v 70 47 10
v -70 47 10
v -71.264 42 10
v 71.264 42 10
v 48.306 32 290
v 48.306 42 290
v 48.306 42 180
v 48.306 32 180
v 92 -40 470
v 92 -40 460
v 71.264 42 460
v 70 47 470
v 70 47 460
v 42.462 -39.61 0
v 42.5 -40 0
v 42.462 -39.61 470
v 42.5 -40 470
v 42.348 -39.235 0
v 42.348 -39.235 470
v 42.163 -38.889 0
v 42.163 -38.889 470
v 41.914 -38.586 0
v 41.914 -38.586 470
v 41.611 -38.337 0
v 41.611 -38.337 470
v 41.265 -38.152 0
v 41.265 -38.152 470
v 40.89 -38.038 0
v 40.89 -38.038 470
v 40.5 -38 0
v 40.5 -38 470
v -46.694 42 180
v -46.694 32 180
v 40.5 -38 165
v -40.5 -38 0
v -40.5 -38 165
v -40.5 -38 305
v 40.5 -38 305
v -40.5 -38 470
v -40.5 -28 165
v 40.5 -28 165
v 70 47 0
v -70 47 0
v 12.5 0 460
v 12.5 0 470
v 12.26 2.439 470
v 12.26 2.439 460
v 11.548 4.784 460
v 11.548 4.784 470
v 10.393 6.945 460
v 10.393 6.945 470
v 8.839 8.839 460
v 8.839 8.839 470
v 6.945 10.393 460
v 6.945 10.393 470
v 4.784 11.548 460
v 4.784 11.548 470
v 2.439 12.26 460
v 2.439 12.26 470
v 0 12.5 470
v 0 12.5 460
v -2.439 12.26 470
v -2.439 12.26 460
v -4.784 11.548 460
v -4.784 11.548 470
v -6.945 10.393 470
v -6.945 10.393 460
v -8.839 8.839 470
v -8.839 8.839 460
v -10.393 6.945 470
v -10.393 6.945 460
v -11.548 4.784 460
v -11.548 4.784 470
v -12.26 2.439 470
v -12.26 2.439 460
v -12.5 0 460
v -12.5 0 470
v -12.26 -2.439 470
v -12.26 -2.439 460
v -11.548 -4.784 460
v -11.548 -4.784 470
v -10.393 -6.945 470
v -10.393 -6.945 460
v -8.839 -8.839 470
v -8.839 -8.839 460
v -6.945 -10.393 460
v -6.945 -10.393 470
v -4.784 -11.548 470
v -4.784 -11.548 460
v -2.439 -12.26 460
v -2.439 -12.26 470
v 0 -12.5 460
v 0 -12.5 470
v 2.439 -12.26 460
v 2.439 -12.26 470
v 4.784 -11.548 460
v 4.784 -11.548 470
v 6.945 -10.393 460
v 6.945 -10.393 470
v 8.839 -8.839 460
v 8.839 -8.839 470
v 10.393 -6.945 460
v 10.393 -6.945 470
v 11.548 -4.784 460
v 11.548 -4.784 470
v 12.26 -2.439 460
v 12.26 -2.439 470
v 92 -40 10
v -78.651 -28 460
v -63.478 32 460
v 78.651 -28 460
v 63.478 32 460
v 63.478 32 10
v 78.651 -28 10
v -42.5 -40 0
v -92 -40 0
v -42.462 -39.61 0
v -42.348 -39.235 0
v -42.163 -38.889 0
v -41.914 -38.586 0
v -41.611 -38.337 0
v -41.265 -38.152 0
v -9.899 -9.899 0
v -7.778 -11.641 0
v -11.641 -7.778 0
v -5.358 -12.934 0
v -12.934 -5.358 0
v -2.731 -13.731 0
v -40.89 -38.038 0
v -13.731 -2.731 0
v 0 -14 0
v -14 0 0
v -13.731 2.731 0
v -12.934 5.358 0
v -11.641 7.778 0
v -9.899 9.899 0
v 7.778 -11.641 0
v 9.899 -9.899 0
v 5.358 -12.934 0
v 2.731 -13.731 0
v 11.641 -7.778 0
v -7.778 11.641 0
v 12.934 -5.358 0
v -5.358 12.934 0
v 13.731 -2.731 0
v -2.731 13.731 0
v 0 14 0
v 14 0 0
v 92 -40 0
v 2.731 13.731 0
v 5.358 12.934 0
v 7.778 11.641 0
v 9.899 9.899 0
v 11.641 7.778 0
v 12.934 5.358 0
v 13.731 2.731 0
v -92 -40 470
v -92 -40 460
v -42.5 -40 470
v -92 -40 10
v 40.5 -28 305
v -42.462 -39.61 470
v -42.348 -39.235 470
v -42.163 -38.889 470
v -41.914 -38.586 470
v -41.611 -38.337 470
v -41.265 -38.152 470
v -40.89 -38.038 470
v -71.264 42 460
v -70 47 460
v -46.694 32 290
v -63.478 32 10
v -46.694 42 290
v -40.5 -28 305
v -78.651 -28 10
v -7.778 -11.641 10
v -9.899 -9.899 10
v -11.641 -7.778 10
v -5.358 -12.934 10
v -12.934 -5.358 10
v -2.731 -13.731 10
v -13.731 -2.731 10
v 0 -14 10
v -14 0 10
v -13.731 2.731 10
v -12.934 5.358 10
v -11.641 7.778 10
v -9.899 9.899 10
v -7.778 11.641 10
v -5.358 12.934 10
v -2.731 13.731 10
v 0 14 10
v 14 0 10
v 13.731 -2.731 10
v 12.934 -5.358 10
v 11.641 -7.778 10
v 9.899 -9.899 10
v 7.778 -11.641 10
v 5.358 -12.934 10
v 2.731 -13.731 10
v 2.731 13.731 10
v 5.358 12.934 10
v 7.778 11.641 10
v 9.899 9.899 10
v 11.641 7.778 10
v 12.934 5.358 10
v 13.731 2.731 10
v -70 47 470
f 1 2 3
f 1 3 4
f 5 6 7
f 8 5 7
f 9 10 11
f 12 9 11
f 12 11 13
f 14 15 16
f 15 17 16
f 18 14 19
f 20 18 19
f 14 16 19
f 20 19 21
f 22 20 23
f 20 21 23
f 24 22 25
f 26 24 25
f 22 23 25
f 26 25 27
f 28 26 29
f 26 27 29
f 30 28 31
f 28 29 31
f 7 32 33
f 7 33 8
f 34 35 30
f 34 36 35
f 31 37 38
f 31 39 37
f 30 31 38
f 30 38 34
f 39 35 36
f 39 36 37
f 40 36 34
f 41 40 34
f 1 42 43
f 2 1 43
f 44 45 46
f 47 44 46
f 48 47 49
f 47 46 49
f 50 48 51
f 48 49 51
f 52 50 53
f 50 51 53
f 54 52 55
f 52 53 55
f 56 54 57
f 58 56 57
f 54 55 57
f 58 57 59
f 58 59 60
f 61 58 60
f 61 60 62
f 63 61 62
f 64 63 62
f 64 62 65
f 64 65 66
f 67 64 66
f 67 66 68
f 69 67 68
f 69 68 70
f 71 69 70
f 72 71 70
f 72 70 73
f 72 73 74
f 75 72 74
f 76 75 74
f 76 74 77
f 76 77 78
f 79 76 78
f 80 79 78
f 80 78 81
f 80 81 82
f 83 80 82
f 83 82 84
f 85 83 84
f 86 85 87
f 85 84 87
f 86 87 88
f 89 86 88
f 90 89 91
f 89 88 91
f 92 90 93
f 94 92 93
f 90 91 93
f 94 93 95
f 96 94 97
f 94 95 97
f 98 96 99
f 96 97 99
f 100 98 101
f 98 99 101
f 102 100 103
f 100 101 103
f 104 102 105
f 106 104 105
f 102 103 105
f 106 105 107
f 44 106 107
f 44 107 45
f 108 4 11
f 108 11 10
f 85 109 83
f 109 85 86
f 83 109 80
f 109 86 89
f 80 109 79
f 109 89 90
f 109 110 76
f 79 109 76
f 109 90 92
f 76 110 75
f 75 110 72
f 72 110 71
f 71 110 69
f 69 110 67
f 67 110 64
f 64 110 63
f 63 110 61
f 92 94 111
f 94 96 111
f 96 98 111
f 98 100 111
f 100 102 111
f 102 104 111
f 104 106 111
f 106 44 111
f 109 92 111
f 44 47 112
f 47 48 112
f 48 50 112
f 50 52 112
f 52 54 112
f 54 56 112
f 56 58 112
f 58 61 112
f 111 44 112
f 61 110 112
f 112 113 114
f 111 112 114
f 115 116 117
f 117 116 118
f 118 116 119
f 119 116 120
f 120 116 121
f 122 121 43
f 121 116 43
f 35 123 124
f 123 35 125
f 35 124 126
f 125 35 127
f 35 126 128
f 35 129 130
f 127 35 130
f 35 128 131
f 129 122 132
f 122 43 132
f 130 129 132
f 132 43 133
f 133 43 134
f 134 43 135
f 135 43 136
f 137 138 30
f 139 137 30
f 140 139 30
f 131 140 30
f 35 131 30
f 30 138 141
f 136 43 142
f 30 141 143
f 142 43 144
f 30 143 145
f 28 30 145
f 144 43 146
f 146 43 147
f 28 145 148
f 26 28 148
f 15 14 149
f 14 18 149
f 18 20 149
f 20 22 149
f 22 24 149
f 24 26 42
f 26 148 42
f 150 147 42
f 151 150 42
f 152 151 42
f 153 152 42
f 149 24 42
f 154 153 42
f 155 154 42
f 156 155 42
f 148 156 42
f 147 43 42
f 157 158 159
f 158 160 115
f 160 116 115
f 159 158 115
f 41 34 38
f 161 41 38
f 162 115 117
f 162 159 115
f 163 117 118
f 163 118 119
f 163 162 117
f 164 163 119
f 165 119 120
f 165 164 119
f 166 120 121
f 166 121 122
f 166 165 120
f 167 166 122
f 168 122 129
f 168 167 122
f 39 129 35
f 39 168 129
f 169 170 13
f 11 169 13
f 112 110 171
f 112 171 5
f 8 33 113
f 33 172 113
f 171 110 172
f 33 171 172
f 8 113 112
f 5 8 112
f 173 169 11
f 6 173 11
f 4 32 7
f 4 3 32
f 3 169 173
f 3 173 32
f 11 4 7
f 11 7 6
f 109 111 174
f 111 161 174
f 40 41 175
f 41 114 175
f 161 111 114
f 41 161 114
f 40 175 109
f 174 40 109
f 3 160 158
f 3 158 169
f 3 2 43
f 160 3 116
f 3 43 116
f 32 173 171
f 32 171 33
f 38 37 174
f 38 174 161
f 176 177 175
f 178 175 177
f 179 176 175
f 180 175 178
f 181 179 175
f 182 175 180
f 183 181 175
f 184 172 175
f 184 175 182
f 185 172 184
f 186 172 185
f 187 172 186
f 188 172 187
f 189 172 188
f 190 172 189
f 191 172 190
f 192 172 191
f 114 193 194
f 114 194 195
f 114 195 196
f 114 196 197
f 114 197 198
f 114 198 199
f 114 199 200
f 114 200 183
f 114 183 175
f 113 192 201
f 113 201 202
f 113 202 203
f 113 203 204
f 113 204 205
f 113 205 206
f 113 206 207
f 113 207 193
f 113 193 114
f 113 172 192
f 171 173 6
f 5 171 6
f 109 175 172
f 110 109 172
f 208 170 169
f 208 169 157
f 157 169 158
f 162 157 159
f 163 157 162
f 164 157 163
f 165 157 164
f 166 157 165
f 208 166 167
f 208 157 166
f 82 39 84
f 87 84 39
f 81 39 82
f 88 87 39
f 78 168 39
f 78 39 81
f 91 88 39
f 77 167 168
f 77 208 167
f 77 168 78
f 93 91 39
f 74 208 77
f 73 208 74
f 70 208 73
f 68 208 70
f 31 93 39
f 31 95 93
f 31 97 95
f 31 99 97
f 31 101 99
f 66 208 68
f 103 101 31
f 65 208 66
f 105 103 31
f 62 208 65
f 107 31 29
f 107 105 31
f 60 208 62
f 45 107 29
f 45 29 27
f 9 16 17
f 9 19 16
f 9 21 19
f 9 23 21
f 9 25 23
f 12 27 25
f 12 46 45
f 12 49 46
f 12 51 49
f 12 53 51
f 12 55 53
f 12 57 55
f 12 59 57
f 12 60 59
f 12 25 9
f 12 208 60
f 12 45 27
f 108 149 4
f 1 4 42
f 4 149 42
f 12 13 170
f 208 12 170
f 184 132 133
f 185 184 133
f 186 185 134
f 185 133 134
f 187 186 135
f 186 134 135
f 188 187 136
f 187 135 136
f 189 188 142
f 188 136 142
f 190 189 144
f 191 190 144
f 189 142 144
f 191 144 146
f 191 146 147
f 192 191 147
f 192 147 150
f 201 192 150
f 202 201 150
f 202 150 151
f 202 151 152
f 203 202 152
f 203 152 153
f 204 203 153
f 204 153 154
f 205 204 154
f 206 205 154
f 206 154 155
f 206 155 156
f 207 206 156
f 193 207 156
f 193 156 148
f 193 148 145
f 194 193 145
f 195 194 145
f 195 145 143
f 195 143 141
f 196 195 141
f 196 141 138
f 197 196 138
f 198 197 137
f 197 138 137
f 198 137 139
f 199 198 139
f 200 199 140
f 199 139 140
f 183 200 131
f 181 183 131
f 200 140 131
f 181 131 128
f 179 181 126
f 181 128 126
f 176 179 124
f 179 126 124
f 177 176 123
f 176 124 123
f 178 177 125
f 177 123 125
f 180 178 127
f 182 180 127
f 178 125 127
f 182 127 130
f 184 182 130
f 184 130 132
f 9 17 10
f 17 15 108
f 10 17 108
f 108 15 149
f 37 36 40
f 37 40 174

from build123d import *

# Parameters (mm, degrees)
DODANIE_WYCI_GNI_CIE1_DEPTH = 10
WYTNIJ_WYCI_GNI_CIE1_REACH  = 105.793
SZKIC2_R                    = 14
DODANIE_WYCI_GNI_CIE2_DEPTH = 450
DODANIE_WYCI_GNI_CIE3_DEPTH = 10
WYTNIJ_WYCI_GNI_CIE2_REACH  = 483.22
SZKIC5_R                    = 12.5
SZKIC7_W                    = 85
SZKIC7_H                    = 470
WYTNIJ_WYCI_GNI_CIE3_DEPTH  = 2
ZAOKR_GLENIE1_R             = 2
WYTNIJ_WYCI_GNI_CIE4_REACH  = 488.404
SZKIC8_W                    = 81
SZKIC8_H                    = 140
WYTNIJ_WYCI_GNI_CIE5_REACH  = 487.889
SZKIC9_W                    = 95
SZKIC9_H                    = 110


with BuildPart() as part:
    # Szkic1 → Dodanie-wyciągnięcie1 (new body)
    with BuildSketch(Plane.XY):
        Polygon((70, 47), (-70, 47), (-92, -40), (92, -40), align=None)
    extrude(amount=DODANIE_WYCI_GNI_CIE1_DEPTH)

    # Szkic2 → Wytnij-wyciągnięcie1 (cut, up to next)
    with BuildSketch(Plane(origin=(0, 0, 0), x_dir=(-1, 0, 0), z_dir=(0, 0, -1)), mode=Mode.PRIVATE) as wytnij_wyci_gni_cie1_sk1:
        Circle(SZKIC2_R)
    wytnij_wyci_gni_cie1_tool1 = extrude(wytnij_wyci_gni_cie1_sk1.sketch, amount=-WYTNIJ_WYCI_GNI_CIE1_REACH, mode=Mode.PRIVATE) & part.part
    add(wytnij_wyci_gni_cie1_tool1.solids().sort_by_distance((0, 0, 0))[0], mode=Mode.SUBTRACT)

    # Szkic3 → Dodanie-wyciągnięcie2 (add)
    with BuildSketch(Plane.XY.offset(10)):
        Polygon((-71.264367816, 42), (71.264367816, 42), (92, -40), (-92, -40), align=None)
        Polygon((-63.478332297, 32), (63.478332297, 32), (78.65074609, -28), (-78.65074609, -28), align=None, mode=Mode.SUBTRACT)
    extrude(amount=DODANIE_WYCI_GNI_CIE2_DEPTH)

    # Szkic4 → Dodanie-wyciągnięcie3 (add)
    with BuildSketch(Plane.XY.offset(460)):
        Polygon((-70, 47), (-92, -40), (92, -40), (70, 47), align=None)
    extrude(amount=DODANIE_WYCI_GNI_CIE3_DEPTH)

    # Szkic5 → Wytnij-wyciągnięcie2 (cut, up to next)
    with BuildSketch(Plane.XY.offset(470), mode=Mode.PRIVATE) as wytnij_wyci_gni_cie2_sk1:
        Circle(SZKIC5_R)
    wytnij_wyci_gni_cie2_tool1 = extrude(wytnij_wyci_gni_cie2_sk1.sketch, amount=-WYTNIJ_WYCI_GNI_CIE2_REACH, mode=Mode.PRIVATE) & part.part
    add(wytnij_wyci_gni_cie2_tool1.solids().sort_by_distance((0, 0, 470))[0], mode=Mode.SUBTRACT)

    # Szkic7 → Wytnij-wyciągnięcie3 (cut)
    with BuildSketch(Plane.XZ.offset(40)):
        with Locations((0, 235)):
            Rectangle(SZKIC7_W, SZKIC7_H)
    extrude(amount=-WYTNIJ_WYCI_GNI_CIE3_DEPTH, mode=Mode.SUBTRACT)

    # Zaokrąglenie1
    zaokr_glenie1_edges = [part.edges().sort_by_distance(p)[0] for p in [
        (42.5, -38, 235),
        (-42.5, -38, 235),
    ]]
    fillet(zaokr_glenie1_edges, radius=ZAOKR_GLENIE1_R - 0.0001)  # a hair under: the kernel refuses the full size

    # Szkic8 → Wytnij-wyciągnięcie4 (cut, up to next)
    with BuildSketch(Plane.XZ.offset(38), mode=Mode.PRIVATE) as wytnij_wyci_gni_cie4_sk1:
        with Locations((0, 235)):
            Rectangle(SZKIC8_W, SZKIC8_H)
    wytnij_wyci_gni_cie4_tool1 = extrude(wytnij_wyci_gni_cie4_sk1.sketch, amount=-WYTNIJ_WYCI_GNI_CIE4_REACH, mode=Mode.PRIVATE) & part.part
    add(wytnij_wyci_gni_cie4_tool1.solids().sort_by_distance((0, -38, 235))[0], mode=Mode.SUBTRACT)

    # Szkic9 → Wytnij-wyciągnięcie5 (cut, up to next)
    with BuildSketch(Plane(origin=(0, 42, 0), x_dir=(1, 0, 0), z_dir=(0, 1, 0)), mode=Mode.PRIVATE) as wytnij_wyci_gni_cie5_sk1:
        with Locations((0.805940964, -235)):
            Rectangle(SZKIC9_W, SZKIC9_H)
    wytnij_wyci_gni_cie5_tool1 = extrude(wytnij_wyci_gni_cie5_sk1.sketch, amount=-WYTNIJ_WYCI_GNI_CIE5_REACH, mode=Mode.PRIVATE) & part.part
    add(wytnij_wyci_gni_cie5_tool1.solids().sort_by_distance((0.805941, 42, 235))[0], mode=Mode.SUBTRACT)


solid = part.part
